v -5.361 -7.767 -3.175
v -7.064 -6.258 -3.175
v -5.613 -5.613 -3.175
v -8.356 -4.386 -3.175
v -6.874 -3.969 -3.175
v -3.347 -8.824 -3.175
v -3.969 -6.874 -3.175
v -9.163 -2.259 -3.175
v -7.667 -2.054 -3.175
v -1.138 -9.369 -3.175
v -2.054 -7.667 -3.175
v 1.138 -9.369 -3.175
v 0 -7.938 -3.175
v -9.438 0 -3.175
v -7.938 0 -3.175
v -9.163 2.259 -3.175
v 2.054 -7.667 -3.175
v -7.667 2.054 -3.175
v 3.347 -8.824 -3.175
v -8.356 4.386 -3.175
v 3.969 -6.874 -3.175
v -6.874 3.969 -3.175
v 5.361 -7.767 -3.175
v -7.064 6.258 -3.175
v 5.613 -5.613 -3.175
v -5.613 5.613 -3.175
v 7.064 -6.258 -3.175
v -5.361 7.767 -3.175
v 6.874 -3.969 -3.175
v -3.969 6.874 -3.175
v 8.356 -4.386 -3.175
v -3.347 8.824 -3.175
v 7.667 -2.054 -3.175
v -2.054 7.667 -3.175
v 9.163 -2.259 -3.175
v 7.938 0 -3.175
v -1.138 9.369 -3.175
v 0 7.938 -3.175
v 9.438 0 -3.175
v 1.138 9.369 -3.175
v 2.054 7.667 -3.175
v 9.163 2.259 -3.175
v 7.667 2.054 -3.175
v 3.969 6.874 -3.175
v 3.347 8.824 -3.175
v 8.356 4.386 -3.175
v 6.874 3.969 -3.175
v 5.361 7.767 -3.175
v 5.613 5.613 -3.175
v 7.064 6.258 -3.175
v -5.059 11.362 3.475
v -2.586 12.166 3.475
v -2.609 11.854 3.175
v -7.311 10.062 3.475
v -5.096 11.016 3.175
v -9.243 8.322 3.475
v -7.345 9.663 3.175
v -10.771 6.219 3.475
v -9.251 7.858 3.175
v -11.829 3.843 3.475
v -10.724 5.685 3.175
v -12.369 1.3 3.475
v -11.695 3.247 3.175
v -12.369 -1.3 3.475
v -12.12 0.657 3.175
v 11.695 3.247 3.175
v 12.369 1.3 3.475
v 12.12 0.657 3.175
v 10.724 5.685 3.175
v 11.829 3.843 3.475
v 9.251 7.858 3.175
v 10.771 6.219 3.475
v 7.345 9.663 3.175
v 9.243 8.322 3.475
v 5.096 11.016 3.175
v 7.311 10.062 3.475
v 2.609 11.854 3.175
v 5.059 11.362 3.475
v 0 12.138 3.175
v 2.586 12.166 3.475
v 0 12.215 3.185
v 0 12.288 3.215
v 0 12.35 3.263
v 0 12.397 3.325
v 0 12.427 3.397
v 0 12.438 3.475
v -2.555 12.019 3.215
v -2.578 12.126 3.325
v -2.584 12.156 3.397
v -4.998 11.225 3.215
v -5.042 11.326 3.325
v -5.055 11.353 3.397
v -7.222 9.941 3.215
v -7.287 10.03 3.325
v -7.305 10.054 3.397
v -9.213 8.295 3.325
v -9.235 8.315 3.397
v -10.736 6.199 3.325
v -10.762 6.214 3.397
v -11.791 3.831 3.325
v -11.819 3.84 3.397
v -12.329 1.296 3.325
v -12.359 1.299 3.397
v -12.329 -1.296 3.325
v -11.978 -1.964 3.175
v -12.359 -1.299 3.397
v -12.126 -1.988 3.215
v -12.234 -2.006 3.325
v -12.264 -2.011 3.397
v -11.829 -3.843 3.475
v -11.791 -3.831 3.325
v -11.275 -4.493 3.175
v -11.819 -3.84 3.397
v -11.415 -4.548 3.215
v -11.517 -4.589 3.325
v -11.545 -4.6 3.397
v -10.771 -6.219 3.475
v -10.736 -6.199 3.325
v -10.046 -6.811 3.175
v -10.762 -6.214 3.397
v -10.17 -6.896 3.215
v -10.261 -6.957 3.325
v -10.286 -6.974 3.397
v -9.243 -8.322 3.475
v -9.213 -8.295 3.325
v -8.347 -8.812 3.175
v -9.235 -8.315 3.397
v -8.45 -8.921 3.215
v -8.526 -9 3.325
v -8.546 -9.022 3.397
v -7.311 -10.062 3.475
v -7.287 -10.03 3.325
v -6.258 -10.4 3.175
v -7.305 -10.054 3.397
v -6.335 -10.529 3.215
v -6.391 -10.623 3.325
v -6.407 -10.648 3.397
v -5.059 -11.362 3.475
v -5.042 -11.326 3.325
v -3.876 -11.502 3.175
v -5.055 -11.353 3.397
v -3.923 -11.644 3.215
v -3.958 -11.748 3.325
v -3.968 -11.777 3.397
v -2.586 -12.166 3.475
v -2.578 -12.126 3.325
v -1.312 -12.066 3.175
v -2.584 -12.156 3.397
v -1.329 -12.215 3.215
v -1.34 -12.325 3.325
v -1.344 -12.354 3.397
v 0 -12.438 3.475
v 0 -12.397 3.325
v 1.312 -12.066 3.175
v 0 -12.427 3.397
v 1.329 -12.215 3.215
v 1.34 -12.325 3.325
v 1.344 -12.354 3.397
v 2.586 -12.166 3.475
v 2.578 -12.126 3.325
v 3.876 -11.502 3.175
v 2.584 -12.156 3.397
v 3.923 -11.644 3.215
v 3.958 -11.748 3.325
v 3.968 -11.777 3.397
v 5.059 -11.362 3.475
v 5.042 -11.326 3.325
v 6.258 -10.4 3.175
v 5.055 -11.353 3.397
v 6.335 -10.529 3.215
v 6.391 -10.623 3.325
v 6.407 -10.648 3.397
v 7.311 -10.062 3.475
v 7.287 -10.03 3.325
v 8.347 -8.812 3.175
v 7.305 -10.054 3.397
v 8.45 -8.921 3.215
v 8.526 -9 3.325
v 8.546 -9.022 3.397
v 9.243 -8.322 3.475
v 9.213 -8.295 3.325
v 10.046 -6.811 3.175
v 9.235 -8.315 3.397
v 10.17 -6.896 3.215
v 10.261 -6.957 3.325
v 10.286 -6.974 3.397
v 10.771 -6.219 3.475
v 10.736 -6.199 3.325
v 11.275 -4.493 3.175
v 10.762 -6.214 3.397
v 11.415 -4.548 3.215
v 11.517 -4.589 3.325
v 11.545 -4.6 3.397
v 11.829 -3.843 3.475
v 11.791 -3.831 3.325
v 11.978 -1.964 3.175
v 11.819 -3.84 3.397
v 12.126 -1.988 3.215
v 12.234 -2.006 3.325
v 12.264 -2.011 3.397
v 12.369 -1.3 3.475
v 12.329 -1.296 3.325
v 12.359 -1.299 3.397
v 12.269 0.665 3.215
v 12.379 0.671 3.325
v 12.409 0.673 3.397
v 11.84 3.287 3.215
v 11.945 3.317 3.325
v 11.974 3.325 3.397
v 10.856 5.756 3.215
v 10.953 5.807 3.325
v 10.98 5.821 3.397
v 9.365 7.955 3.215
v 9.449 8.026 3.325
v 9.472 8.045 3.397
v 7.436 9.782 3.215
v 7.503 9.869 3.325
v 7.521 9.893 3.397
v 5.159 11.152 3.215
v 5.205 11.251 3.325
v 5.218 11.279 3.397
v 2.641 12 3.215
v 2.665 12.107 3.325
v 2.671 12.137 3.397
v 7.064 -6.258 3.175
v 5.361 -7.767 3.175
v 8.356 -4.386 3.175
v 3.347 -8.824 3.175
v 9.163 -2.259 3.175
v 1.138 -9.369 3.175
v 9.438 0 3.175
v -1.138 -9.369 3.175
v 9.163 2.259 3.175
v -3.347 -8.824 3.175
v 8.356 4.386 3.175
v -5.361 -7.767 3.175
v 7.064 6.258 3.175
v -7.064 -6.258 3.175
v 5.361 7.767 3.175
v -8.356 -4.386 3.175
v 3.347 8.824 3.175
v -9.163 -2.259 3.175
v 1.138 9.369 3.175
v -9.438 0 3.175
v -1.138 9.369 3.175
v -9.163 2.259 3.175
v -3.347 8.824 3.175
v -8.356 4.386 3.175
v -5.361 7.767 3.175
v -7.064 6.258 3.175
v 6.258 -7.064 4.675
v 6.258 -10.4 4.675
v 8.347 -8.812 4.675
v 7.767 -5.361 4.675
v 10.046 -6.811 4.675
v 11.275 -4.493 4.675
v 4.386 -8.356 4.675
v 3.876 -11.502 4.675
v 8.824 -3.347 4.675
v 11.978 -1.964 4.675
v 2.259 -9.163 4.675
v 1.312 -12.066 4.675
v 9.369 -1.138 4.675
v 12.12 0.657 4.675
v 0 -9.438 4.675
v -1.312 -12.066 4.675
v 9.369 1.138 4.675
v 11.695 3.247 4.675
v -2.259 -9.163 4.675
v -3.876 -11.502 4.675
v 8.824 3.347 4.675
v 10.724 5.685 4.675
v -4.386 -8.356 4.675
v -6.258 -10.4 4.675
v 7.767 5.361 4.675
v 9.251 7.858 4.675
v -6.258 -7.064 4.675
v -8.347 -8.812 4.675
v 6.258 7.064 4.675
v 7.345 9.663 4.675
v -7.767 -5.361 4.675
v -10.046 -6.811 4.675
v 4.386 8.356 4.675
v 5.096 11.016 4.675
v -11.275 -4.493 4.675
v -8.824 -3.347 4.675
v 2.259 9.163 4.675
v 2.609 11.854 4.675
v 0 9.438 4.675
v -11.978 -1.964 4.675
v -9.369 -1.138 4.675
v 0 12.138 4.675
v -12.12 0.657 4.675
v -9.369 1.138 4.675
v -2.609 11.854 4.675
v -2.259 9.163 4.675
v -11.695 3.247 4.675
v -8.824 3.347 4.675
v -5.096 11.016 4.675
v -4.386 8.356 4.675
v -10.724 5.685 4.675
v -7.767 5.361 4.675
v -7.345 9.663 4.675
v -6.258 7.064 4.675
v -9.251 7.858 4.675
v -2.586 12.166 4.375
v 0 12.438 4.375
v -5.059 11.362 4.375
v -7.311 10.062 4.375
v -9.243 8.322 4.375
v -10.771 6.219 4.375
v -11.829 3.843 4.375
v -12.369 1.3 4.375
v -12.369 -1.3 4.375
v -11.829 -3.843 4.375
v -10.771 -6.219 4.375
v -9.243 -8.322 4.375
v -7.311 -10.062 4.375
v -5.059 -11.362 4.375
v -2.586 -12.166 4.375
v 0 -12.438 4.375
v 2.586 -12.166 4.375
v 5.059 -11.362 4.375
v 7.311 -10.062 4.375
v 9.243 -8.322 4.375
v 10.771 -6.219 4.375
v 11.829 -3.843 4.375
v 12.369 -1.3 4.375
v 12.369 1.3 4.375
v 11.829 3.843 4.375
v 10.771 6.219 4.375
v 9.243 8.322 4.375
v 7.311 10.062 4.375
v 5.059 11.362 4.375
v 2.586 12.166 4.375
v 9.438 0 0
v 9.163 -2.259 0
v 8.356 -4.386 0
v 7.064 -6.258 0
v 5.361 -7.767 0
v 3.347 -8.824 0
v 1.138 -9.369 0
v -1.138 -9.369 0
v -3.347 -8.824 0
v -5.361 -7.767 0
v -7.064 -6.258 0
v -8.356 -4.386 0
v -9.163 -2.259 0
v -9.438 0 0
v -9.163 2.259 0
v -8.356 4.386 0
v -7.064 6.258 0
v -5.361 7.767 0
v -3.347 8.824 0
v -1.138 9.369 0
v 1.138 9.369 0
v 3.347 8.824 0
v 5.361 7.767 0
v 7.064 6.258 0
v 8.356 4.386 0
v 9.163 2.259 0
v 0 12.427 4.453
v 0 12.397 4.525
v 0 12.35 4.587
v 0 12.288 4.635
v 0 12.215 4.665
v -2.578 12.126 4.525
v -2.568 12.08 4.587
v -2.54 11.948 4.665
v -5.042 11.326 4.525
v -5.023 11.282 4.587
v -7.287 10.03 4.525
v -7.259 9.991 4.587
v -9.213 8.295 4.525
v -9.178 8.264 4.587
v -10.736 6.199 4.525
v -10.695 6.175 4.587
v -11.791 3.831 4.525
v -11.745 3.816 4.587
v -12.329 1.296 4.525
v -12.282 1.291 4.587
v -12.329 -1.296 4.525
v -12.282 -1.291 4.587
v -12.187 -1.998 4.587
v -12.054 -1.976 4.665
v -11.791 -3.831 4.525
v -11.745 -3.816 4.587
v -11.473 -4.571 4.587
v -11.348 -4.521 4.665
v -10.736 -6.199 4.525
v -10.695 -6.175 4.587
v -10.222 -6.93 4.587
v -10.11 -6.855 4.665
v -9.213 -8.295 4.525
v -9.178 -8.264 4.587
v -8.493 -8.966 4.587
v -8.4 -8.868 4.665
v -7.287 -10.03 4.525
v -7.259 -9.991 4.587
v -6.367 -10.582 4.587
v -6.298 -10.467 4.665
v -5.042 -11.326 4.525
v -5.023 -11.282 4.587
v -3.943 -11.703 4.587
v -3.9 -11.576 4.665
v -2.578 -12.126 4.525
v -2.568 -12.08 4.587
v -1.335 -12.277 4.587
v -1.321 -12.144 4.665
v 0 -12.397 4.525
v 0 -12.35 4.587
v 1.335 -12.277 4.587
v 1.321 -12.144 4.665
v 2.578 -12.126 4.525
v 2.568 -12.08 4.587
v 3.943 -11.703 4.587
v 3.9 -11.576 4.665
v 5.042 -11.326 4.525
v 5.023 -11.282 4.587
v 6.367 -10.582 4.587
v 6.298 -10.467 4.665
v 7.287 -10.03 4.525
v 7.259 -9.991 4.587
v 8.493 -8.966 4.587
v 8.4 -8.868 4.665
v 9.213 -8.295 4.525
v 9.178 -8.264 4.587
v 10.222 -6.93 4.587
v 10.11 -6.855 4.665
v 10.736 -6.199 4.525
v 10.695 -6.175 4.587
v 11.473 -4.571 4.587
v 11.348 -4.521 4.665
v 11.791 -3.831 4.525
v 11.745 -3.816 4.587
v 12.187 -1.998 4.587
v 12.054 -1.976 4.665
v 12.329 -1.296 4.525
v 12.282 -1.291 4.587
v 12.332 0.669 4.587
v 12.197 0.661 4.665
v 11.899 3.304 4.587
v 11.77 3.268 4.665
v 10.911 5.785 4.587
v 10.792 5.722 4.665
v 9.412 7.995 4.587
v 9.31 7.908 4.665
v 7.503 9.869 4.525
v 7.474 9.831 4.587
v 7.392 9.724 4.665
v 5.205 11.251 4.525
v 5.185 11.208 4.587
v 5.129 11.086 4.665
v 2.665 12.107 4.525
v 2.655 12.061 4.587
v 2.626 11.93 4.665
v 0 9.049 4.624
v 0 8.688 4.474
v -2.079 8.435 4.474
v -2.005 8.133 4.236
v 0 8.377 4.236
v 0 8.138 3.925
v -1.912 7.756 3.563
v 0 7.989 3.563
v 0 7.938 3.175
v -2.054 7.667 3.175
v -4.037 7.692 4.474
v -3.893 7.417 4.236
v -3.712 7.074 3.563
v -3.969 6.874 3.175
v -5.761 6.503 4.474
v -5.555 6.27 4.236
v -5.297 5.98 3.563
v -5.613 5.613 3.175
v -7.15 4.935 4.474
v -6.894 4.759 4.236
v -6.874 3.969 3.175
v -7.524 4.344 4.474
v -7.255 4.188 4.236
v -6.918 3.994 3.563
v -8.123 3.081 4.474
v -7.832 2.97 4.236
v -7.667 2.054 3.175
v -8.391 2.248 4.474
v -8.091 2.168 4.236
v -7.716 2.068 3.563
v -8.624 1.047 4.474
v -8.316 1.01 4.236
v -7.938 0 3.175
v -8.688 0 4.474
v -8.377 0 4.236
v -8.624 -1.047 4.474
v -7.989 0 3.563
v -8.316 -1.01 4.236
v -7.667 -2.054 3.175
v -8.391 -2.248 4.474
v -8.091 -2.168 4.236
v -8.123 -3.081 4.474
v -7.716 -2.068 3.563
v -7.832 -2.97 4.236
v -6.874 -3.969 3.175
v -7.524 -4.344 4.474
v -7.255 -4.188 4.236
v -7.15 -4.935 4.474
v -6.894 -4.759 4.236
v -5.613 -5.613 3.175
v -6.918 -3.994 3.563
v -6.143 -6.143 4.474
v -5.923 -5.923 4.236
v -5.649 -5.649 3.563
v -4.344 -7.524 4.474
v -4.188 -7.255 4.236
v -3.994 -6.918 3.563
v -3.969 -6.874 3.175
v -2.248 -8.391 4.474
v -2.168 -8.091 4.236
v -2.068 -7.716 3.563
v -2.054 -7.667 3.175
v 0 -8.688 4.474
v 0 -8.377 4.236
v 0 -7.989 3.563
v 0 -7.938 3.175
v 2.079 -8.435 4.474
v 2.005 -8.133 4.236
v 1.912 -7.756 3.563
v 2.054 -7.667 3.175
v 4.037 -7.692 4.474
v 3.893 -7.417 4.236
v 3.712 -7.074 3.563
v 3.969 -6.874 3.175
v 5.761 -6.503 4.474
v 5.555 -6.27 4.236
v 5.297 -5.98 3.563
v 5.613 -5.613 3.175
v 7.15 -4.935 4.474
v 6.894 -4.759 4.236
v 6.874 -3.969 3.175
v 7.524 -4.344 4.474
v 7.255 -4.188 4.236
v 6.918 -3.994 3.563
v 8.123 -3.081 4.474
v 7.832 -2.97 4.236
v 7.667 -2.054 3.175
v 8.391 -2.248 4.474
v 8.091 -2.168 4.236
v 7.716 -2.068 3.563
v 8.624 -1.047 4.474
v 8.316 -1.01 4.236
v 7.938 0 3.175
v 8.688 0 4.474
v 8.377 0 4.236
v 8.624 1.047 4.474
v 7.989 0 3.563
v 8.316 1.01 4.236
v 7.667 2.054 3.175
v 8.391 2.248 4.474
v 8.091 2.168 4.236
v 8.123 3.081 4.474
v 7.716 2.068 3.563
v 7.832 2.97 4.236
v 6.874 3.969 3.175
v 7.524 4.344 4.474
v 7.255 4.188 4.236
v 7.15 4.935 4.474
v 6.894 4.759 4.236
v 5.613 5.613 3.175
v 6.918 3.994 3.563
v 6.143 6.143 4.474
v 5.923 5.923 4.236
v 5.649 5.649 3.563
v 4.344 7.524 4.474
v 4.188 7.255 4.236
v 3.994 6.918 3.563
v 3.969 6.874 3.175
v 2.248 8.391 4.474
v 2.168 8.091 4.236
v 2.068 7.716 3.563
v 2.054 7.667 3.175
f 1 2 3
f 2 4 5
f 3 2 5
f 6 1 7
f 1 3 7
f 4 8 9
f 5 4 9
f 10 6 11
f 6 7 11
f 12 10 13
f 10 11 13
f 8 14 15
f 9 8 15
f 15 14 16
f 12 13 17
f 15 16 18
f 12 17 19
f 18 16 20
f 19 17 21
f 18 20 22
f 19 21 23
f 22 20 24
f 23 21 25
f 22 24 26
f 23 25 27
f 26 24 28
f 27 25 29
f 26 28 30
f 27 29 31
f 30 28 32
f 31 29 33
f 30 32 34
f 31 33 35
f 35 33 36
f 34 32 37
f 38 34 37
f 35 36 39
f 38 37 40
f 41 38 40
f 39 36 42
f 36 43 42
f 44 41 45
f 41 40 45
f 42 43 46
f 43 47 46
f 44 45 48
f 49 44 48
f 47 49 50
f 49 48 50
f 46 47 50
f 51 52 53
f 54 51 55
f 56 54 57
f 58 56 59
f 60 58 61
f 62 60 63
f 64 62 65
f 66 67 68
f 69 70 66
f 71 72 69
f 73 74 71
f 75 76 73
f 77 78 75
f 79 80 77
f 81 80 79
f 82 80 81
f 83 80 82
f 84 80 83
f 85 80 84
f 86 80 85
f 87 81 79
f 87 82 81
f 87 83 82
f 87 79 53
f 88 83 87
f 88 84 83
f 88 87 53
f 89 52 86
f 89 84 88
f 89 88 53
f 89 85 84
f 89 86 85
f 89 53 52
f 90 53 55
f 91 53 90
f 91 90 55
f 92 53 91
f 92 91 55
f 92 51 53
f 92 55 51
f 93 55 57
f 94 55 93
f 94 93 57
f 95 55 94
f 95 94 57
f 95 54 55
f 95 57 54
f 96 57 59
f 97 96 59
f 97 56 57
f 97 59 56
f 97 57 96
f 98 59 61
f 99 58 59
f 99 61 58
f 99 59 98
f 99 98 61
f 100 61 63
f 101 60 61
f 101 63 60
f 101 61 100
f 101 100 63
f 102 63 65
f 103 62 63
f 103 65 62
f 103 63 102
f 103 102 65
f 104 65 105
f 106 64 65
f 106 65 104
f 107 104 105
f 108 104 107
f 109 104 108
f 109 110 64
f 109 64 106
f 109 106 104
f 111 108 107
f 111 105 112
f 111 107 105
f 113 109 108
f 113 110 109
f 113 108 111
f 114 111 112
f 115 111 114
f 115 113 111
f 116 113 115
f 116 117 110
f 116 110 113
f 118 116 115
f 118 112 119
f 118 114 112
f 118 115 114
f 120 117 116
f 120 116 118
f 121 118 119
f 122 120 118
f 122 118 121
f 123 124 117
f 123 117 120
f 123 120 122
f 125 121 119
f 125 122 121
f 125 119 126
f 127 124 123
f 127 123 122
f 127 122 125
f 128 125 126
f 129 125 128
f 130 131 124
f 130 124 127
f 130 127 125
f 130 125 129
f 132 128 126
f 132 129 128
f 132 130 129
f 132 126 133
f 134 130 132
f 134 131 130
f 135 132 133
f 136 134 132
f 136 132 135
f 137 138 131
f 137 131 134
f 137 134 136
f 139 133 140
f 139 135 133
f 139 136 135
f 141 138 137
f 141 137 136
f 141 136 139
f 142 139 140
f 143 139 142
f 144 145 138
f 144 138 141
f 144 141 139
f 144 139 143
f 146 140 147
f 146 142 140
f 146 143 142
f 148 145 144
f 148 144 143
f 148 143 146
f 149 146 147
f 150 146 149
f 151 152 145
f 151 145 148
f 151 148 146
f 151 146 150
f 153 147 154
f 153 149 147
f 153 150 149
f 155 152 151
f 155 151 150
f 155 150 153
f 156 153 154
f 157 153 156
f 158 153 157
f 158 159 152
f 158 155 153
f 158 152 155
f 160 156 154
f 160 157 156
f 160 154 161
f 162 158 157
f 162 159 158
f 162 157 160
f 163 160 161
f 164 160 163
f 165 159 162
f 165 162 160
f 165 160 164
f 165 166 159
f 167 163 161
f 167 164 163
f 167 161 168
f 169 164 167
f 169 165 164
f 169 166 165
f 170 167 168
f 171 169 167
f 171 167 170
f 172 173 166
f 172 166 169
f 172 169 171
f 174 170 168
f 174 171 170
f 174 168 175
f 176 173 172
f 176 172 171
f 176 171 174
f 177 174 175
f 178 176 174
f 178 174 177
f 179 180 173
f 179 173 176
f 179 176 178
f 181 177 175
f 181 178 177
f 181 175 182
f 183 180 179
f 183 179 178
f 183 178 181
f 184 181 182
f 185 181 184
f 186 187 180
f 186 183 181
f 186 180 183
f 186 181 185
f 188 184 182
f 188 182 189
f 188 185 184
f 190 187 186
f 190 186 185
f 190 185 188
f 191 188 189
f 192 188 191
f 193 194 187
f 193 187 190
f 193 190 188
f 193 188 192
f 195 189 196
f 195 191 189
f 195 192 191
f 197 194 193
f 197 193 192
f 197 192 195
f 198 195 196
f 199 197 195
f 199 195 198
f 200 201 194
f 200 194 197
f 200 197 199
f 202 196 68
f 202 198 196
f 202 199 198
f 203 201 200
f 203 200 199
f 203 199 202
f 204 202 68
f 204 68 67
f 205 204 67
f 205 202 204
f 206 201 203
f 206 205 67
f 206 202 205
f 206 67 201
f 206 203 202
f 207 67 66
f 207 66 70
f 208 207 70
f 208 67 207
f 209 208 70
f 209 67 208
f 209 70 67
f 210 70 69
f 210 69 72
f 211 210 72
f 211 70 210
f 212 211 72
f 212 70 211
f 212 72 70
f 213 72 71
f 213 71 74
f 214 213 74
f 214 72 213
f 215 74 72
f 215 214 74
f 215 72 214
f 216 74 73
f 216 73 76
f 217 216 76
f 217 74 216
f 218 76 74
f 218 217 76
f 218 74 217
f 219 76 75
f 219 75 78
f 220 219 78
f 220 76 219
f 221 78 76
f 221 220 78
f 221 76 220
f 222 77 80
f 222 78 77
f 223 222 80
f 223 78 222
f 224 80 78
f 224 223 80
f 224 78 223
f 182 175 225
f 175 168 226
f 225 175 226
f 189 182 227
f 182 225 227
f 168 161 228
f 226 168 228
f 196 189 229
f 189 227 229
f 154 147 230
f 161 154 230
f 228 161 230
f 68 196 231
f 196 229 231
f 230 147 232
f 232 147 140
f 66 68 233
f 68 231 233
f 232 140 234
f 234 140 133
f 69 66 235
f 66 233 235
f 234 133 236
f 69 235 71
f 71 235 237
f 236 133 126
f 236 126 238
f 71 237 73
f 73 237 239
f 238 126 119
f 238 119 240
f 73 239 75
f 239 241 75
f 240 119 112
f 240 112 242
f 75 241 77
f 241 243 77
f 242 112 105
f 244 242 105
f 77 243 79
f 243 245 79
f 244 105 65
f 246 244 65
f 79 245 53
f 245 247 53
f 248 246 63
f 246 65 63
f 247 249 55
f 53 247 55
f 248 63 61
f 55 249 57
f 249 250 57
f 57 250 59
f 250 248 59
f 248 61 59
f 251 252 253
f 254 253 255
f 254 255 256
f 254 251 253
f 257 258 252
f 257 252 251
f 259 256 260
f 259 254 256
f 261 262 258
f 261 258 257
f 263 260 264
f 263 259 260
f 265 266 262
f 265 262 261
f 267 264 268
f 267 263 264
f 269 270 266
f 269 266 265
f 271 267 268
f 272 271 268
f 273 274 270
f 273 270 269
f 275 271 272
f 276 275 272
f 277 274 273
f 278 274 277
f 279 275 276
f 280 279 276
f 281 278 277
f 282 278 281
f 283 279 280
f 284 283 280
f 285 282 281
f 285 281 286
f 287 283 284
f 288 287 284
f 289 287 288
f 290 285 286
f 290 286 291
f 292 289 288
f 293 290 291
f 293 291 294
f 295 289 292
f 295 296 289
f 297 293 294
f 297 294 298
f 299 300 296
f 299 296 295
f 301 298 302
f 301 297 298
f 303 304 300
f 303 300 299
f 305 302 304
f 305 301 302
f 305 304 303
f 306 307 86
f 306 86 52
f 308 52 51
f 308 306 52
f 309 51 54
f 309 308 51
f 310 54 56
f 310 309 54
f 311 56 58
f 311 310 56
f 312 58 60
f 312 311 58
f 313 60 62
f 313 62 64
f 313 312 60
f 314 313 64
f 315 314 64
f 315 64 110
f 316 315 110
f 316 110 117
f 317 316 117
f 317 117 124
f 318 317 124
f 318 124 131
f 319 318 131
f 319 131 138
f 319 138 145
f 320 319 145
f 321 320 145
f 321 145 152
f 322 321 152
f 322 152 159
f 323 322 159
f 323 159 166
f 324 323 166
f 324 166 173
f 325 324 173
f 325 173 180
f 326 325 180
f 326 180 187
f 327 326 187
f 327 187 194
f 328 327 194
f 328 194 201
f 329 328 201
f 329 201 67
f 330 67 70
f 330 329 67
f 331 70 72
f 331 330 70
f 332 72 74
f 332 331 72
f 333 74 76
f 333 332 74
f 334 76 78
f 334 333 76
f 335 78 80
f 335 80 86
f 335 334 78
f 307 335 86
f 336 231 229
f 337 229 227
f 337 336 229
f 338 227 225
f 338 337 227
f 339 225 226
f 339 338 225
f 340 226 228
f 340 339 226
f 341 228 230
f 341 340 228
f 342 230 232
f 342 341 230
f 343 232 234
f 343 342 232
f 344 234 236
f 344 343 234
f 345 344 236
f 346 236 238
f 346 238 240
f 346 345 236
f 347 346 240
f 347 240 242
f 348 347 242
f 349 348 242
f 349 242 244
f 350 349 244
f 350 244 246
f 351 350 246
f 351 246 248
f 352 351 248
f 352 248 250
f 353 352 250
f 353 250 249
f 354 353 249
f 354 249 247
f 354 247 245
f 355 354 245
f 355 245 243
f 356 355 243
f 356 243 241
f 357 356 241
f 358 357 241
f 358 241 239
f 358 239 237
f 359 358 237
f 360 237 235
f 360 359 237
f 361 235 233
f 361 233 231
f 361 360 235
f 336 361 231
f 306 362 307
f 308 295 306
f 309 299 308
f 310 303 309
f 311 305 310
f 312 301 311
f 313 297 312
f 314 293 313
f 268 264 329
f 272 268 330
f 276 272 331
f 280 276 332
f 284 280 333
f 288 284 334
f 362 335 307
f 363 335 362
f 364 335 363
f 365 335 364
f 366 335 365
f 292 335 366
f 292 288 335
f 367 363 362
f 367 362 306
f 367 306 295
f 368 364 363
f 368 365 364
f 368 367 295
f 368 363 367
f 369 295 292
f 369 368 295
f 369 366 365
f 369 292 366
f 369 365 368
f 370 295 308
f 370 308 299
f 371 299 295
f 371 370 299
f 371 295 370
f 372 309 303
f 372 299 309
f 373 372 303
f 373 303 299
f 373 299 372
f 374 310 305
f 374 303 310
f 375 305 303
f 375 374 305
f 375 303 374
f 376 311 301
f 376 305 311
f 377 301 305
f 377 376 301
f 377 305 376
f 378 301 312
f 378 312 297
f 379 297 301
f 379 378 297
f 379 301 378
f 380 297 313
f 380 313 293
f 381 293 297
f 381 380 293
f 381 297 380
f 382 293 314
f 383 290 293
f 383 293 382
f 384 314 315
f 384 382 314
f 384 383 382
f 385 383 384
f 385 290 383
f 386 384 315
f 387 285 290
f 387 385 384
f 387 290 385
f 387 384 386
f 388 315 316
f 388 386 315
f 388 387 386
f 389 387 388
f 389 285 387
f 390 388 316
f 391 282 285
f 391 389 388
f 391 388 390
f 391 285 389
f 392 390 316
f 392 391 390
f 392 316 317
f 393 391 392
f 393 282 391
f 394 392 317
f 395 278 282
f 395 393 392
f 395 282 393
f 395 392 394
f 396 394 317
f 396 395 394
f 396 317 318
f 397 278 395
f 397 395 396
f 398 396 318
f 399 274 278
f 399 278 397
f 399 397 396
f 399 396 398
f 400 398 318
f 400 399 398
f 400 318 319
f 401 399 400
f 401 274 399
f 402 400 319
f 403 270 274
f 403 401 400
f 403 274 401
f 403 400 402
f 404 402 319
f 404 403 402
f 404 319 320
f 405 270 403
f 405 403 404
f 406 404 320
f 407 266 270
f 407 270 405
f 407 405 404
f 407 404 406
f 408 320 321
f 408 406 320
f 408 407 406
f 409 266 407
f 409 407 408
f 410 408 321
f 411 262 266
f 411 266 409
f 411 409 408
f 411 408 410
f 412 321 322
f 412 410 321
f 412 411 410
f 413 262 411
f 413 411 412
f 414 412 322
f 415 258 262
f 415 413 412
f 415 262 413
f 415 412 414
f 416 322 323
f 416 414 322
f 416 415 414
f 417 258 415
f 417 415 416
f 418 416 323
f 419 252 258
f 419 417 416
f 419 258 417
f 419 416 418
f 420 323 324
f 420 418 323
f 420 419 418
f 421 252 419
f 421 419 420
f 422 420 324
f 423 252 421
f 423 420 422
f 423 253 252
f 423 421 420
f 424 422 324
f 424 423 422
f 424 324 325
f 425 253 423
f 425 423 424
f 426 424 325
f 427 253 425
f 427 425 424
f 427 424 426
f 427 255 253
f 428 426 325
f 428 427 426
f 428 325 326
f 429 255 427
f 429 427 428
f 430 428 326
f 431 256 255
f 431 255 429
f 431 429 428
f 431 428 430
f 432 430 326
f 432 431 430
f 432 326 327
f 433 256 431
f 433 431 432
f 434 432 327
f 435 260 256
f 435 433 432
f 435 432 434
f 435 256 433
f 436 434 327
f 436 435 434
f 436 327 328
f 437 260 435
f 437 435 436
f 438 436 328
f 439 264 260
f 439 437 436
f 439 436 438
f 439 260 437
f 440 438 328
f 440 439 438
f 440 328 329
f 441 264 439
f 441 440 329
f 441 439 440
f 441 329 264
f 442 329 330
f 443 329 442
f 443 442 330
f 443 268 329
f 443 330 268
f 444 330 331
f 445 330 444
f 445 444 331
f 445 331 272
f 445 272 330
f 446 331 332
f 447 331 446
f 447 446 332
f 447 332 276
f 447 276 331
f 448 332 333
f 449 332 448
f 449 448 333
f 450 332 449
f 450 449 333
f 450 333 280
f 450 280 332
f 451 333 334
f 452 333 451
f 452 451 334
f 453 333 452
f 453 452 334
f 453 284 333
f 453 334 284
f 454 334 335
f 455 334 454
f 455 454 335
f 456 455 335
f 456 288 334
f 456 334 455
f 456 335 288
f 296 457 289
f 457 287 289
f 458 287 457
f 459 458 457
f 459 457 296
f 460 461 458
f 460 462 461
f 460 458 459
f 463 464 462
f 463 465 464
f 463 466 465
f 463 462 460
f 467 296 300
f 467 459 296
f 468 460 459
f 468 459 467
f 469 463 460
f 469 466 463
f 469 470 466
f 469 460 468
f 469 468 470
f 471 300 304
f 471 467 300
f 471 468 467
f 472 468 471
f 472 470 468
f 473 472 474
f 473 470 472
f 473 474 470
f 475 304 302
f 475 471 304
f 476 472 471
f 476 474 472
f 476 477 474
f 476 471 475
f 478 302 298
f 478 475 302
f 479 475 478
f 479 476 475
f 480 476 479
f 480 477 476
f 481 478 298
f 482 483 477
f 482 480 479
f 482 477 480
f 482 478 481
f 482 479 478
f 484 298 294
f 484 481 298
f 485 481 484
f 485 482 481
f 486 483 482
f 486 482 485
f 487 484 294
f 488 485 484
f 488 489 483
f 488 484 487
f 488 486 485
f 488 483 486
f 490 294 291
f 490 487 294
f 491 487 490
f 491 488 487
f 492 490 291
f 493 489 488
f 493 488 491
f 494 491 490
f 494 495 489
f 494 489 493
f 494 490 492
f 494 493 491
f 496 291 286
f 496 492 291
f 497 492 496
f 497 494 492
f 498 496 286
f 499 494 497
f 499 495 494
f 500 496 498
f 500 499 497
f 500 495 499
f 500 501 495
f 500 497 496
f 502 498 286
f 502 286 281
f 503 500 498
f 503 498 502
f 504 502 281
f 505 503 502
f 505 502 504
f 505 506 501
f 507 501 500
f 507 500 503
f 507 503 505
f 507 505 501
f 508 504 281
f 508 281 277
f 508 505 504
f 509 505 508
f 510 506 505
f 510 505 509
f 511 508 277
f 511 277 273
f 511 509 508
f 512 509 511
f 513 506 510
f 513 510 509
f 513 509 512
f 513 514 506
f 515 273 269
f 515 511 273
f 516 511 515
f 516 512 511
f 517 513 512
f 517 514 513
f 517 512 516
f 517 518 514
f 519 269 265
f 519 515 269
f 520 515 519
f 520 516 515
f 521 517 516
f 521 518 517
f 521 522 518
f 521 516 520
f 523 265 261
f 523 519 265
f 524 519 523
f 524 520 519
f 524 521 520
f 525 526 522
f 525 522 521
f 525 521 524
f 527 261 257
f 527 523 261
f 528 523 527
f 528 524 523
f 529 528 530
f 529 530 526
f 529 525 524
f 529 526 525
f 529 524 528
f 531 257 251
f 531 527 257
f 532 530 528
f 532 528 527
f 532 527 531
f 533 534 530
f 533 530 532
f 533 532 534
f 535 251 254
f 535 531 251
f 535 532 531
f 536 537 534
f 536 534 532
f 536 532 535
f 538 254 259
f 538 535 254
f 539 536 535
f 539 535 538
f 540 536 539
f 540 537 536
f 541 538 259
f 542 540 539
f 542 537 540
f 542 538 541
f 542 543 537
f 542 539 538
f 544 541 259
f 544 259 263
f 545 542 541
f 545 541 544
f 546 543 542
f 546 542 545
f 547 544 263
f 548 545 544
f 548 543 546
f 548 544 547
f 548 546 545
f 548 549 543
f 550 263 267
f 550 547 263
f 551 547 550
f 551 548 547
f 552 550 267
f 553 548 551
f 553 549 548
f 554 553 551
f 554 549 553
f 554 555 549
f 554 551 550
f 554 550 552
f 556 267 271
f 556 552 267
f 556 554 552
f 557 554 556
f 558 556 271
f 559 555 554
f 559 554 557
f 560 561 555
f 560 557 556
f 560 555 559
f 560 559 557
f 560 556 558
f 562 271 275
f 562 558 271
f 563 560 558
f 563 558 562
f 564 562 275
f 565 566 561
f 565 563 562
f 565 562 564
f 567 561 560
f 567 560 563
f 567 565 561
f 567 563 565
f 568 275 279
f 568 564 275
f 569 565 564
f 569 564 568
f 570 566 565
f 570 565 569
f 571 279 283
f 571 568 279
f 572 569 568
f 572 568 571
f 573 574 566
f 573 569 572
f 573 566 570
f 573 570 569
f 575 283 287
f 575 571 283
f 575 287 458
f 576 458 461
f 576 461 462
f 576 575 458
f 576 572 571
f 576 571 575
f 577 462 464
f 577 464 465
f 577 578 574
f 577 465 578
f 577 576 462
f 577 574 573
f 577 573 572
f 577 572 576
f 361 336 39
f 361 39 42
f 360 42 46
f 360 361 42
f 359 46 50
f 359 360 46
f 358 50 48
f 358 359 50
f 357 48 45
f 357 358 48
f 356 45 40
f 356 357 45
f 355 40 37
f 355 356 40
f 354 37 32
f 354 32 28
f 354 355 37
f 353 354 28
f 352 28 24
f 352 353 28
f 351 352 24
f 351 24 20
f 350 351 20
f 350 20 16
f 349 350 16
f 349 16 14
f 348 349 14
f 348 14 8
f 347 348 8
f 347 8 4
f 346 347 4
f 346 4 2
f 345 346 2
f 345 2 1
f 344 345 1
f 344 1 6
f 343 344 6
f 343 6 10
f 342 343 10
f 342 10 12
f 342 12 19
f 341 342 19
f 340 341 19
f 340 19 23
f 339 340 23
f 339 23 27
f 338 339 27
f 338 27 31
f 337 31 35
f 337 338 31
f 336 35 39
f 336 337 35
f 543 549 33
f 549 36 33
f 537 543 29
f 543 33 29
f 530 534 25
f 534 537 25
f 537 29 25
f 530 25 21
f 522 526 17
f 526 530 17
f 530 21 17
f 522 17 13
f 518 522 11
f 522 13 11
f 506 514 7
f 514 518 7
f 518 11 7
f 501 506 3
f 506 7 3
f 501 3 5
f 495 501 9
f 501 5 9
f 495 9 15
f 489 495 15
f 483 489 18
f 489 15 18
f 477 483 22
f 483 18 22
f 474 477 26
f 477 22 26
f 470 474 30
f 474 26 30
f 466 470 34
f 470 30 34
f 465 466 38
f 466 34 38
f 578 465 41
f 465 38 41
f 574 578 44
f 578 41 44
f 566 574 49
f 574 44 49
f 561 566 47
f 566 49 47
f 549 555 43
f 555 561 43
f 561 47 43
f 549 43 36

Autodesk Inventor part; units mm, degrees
ref_plane "YZ Plane" through (0, 0, 0) normal (1, 0, 0) x (0, 1, 0)
ref_plane "XZ Plane" through (0, 0, 0) normal (0, 1, 0) x (-1, 0, 0)
ref_plane "XY Plane" through (0, 0, 0) normal (0, 0, 1) x (1, 0, 0)
sketch "Boceto1" plane through (0, 0, 0) normal (0, 0, 1) x (1, 0, 0)
  circle A0 centre (0, 0) radius 7.9375
  circle A1 centre (0, 0) radius 9.4375
  dimension "d0" = 15.875
  dimension "d1" = 18.875
extrude "Extrusión1" add sketch "Boceto1" along normal mid plane 6.35
sketch "Boceto2" plane through (0, 0, 0) normal (1, 0, 0) x (0, 1, 0)
  line L0 (9.4375, 3.175) -> (12.1375, 3.175)
  line L1 (12.4375, 3.475) -> (12.4375, 4.375)
  line L2 (12.1375, 4.675) -> (9.4375, 4.675)
  arc A0 (9.4375, 4.675) -> (7.9375, 3.175) centre (9.4375, 3.175) ccw
  arc A1 (12.1375, 3.175) -> (12.4375, 3.475) centre (12.1375, 3.475) ccw
  arc A2 (12.4375, 4.375) -> (12.1375, 4.675) centre (12.1375, 4.375) ccw
  line L3 (9.4375, 3.175) -> (7.9375, 3.175)
  line L4 (0, -0.6796) -> (0, 4.0778) projected
  point P0 (0, 0)
  point P1 (12.4375, 3.175)
  point P2 (12.4375, 4.675)
  dimension "d4" = 3
  dimension "d5" = 1.5
  dimension "d6" = 3
  dimension "d7" = 0.3
revolve "Revolución1" add sketch "Boceto2" angle 360 about axis through (0, 0, -10) along (0, 0, 1)
properties part number "buje_carro_zona_calor"
